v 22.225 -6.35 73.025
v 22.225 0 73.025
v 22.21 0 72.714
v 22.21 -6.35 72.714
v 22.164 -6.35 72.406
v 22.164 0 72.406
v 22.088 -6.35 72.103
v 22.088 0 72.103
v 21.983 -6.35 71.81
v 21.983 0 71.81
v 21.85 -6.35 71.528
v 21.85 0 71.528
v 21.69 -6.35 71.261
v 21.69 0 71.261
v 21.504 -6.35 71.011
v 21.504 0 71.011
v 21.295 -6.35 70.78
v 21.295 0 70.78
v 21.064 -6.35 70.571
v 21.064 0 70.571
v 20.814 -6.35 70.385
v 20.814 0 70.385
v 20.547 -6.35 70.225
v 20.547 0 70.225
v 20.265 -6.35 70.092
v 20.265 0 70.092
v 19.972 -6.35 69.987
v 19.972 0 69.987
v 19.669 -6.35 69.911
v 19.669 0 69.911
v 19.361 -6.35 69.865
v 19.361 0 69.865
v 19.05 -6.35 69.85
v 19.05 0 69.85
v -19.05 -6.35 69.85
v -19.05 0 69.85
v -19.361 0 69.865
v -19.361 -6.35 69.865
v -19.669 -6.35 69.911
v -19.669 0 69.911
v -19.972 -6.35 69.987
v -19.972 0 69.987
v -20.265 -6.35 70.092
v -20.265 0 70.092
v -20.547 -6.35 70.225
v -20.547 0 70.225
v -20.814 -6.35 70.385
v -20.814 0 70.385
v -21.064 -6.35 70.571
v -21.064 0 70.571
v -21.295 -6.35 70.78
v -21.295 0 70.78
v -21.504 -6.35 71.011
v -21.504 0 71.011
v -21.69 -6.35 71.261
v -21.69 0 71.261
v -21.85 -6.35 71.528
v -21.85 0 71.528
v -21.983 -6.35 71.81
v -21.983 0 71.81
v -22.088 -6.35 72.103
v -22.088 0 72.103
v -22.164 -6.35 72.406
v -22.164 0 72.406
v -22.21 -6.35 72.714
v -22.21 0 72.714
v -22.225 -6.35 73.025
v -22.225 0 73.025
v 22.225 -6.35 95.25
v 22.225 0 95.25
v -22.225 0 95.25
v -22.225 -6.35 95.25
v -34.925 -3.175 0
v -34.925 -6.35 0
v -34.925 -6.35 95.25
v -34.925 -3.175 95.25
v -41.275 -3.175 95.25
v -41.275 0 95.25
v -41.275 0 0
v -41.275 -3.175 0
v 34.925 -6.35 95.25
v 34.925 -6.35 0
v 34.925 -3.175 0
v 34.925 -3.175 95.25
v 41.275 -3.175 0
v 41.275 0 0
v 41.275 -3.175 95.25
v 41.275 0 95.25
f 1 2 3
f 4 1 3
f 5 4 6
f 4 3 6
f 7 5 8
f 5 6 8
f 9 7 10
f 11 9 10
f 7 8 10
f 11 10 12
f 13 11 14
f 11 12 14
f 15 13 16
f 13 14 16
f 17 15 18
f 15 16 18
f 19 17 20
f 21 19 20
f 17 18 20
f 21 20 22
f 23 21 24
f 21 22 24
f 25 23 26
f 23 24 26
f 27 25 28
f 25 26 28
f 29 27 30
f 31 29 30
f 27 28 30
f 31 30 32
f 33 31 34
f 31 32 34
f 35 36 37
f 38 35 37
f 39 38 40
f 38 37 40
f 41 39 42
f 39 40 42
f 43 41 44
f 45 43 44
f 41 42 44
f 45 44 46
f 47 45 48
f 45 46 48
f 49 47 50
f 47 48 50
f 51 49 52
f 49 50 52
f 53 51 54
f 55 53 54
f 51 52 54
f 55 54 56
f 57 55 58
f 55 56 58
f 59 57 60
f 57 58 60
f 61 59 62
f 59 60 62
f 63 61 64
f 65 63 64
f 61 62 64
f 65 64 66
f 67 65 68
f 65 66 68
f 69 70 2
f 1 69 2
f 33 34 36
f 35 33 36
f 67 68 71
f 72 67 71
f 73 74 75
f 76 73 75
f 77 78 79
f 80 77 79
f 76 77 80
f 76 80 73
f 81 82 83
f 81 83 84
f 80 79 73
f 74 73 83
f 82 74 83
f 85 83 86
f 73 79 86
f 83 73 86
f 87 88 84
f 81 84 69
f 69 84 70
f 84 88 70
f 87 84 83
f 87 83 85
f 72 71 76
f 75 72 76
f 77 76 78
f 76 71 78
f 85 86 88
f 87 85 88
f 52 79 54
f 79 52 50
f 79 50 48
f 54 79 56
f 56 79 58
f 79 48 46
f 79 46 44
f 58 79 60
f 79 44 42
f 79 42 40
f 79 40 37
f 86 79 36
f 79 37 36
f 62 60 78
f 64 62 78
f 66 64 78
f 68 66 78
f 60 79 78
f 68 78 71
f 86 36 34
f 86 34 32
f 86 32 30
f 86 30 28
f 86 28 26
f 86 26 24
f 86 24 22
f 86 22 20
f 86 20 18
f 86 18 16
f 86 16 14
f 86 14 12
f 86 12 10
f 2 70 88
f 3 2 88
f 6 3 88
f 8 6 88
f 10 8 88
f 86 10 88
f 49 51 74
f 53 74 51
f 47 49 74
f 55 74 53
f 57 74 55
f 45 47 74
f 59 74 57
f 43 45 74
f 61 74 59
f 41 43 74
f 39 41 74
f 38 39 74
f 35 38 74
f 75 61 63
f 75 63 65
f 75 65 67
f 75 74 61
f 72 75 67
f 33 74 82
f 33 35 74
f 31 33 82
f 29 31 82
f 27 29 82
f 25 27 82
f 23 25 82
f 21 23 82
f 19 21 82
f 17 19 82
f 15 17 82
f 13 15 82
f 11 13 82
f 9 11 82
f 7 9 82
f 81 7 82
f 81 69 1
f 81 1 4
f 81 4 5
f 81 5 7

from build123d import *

# Parameters (mm, degrees)
F1_DEPTH = 6.35
F2_W     = 6.35
F2_H     = 95.25
F3_DEPTH = 3.175


with BuildPart() as f1:
    # F0 (on Front) → F1 (new body)
    with BuildSketch(Plane.XZ):
        with BuildLine():
            Line((-41.275, 0), (0, 0))
            Line((0, 0), (41.275, 0))
            Line((41.275, 0), (41.275, 95.25))
            Line((41.275, 95.25), (22.225, 95.25))
            Line((22.225, 95.25), (22.225, 73.025))
            ThreePointArc((22.225, 73.025), (21.2950640303, 70.7799359697), (19.05, 69.85))
            Line((19.05, 69.85), (-19.05, 69.85))
            ThreePointArc((-19.05, 69.85), (-21.2950640303, 70.7799359697), (-22.225, 73.025))
            Line((-22.225, 73.025), (-22.225, 95.25))
            Line((-22.225, 95.25), (-41.275, 95.25))
            Line((-41.275, 95.25), (-41.275, 0))
        make_face()
    extrude(amount=F1_DEPTH)

    # F2 (on face) → F3 (cut)
    with BuildSketch(Plane.XZ.offset(6.35)):
        with Locations((-38.1, 47.625)):
            Rectangle(F2_W, F2_H)
        with Locations((38.1, 47.625)):
            Rectangle(F2_W, F2_H)
    extrude(amount=-F3_DEPTH, mode=Mode.SUBTRACT)


solid = f1.part
